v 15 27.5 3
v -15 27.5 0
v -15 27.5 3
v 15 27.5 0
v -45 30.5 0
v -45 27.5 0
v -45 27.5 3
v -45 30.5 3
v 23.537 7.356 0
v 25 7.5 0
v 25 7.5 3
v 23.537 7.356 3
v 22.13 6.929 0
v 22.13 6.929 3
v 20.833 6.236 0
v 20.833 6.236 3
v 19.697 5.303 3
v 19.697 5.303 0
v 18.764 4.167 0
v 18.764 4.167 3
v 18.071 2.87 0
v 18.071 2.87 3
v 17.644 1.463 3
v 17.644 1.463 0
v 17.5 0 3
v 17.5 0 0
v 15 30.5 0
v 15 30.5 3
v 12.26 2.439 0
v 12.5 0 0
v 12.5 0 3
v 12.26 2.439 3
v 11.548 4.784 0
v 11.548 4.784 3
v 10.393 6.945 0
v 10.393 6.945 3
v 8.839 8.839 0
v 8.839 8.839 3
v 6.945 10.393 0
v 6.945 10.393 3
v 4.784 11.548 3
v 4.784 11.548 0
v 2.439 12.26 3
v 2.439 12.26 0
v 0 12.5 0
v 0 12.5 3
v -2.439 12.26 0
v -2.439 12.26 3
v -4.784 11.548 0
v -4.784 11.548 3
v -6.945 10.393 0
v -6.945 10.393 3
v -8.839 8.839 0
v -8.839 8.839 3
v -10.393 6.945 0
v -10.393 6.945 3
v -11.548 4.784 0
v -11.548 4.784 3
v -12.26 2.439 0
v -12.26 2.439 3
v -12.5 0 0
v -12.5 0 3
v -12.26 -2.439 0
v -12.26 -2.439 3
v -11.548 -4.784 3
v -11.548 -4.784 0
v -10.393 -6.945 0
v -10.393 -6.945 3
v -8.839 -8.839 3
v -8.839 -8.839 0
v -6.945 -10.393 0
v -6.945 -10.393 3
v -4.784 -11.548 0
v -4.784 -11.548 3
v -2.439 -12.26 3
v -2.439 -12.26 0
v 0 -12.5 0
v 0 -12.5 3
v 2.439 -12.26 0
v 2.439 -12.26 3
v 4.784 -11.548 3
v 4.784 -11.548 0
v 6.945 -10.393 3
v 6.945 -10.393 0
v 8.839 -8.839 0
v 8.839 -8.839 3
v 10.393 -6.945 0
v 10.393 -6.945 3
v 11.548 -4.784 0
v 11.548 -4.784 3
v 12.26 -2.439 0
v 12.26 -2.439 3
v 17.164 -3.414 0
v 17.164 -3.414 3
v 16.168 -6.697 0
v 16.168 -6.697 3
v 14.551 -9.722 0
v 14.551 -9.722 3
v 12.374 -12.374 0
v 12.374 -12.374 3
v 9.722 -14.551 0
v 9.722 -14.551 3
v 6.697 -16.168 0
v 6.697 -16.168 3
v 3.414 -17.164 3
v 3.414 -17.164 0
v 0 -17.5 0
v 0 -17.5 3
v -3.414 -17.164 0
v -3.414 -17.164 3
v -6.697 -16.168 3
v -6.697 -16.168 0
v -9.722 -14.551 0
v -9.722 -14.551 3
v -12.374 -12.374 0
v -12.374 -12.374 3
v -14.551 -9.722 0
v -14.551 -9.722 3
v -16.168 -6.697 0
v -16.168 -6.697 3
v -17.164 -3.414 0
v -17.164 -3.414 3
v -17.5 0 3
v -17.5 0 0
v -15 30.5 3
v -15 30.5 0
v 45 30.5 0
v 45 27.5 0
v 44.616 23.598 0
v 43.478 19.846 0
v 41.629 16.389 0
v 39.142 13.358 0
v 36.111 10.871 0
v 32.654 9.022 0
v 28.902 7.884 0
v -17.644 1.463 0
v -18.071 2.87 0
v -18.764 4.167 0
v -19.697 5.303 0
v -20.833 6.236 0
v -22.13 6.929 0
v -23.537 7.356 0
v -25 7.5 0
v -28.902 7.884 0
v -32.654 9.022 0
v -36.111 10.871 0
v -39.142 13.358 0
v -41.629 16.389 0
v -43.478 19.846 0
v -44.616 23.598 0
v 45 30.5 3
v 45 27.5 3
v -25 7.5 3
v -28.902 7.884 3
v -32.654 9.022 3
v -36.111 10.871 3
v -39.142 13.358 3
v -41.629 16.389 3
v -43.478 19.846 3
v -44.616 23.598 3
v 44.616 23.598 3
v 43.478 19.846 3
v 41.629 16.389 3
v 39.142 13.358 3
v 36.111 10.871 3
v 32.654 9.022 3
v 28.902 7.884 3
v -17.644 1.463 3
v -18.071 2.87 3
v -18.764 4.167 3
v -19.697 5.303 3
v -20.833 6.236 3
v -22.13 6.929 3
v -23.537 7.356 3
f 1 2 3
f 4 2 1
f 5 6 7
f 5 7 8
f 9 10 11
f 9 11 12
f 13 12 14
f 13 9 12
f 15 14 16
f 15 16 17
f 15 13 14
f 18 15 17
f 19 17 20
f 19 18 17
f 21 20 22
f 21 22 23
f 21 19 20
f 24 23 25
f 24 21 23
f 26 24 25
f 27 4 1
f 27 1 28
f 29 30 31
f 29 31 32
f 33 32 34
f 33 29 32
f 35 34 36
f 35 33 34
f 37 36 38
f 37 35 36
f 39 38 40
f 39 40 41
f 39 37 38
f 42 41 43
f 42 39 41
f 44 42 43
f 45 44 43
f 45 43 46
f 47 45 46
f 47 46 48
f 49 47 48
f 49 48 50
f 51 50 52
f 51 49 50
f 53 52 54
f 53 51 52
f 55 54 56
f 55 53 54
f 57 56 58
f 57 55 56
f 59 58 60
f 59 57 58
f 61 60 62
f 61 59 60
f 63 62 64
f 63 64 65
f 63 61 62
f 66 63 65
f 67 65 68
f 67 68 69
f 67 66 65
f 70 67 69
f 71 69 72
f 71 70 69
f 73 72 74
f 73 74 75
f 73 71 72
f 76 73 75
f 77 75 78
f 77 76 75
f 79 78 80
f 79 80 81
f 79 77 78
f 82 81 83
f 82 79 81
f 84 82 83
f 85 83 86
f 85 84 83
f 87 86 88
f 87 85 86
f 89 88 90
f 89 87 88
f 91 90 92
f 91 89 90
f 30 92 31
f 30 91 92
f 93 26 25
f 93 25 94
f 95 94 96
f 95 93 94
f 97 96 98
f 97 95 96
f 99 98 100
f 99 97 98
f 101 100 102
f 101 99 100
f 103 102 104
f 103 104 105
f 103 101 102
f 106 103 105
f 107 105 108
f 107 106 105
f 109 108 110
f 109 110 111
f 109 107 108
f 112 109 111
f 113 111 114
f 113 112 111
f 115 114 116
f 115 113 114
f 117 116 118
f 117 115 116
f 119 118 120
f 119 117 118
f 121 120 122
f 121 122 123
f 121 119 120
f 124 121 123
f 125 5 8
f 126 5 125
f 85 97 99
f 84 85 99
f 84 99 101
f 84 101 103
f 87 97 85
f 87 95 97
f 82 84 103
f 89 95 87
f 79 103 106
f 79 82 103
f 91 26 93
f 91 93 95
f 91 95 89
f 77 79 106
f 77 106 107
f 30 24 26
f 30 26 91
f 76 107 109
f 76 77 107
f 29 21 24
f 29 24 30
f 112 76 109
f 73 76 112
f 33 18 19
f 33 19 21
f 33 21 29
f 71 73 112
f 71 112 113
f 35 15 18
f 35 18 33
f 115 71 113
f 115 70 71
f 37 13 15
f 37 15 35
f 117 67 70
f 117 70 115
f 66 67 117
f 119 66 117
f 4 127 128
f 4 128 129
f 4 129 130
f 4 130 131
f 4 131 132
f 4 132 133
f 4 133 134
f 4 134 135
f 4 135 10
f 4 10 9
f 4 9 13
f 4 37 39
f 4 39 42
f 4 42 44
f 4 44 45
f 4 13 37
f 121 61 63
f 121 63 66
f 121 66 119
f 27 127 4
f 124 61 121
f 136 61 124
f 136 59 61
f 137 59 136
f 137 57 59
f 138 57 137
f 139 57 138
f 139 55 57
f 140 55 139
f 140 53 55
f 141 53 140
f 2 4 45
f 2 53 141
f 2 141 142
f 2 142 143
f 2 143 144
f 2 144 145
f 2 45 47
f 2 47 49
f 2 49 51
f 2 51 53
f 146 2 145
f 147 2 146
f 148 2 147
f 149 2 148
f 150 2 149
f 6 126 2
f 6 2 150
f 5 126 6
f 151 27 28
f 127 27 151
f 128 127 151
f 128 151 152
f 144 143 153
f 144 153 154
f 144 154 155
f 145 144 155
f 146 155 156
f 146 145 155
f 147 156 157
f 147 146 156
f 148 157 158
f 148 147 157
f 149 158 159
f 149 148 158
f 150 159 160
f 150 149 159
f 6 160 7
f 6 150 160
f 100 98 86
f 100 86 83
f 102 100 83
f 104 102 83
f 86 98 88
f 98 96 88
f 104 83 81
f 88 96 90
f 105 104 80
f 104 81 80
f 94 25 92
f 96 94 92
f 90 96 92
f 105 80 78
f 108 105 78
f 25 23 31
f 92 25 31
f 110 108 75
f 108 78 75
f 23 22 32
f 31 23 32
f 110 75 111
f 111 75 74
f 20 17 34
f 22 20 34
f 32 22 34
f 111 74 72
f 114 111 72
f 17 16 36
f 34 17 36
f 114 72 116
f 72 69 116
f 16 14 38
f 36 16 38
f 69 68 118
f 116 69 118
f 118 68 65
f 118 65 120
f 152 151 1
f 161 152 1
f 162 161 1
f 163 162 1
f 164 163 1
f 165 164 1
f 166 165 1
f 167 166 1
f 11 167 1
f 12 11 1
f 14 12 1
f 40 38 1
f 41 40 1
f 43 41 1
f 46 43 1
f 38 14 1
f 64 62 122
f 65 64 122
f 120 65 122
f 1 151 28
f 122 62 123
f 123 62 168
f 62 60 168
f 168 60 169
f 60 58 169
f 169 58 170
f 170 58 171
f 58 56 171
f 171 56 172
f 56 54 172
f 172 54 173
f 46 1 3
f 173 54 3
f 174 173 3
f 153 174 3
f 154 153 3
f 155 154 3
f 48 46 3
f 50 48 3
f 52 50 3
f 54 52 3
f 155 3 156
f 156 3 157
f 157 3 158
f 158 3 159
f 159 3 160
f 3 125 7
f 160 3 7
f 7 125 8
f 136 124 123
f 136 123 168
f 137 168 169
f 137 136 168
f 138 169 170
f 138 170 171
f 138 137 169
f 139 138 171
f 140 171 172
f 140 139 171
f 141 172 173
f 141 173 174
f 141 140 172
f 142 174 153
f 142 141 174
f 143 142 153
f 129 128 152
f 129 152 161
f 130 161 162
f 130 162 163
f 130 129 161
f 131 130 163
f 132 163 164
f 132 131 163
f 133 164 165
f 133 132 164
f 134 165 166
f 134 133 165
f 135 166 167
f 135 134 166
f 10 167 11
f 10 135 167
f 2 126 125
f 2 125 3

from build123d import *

# Parameters (mm, degrees)
SKETCH1_R           = 12.5
BOSS_EXTRUDE1_DEPTH = 3


with BuildPart() as part:
    # Sketch1 → Boss-Extrude1 (new body)
    with BuildSketch(Plane.XY):
        with BuildLine():
            Line((-15, 27.5), (15, 27.5))
            Line((15, 27.5), (15, 30.5))
            Line((15, 30.5), (45, 30.5))
            Line((45, 30.5), (45, 27.5))
            ThreePointArc((45, 27.5), (39.142135624, 13.357864376), (25, 7.5))
            ThreePointArc((25, 7.5), (19.696699141, 5.303300859), (17.5, 0))
            ThreePointArc((17.5, 0), (0, -17.5), (-17.5, 0))
            ThreePointArc((-17.5, 0), (-19.696699141, 5.303300859), (-25, 7.5))
            ThreePointArc((-25, 7.5), (-39.142135624, 13.357864376), (-45, 27.5))
            Line((-45, 27.5), (-45, 30.5))
            Line((-45, 30.5), (-15, 30.5))
            Line((-15, 30.5), (-15, 27.5))
        make_face()
        Circle(SKETCH1_R, mode=Mode.SUBTRACT)
    extrude(amount=BOSS_EXTRUDE1_DEPTH)


solid = part.part
